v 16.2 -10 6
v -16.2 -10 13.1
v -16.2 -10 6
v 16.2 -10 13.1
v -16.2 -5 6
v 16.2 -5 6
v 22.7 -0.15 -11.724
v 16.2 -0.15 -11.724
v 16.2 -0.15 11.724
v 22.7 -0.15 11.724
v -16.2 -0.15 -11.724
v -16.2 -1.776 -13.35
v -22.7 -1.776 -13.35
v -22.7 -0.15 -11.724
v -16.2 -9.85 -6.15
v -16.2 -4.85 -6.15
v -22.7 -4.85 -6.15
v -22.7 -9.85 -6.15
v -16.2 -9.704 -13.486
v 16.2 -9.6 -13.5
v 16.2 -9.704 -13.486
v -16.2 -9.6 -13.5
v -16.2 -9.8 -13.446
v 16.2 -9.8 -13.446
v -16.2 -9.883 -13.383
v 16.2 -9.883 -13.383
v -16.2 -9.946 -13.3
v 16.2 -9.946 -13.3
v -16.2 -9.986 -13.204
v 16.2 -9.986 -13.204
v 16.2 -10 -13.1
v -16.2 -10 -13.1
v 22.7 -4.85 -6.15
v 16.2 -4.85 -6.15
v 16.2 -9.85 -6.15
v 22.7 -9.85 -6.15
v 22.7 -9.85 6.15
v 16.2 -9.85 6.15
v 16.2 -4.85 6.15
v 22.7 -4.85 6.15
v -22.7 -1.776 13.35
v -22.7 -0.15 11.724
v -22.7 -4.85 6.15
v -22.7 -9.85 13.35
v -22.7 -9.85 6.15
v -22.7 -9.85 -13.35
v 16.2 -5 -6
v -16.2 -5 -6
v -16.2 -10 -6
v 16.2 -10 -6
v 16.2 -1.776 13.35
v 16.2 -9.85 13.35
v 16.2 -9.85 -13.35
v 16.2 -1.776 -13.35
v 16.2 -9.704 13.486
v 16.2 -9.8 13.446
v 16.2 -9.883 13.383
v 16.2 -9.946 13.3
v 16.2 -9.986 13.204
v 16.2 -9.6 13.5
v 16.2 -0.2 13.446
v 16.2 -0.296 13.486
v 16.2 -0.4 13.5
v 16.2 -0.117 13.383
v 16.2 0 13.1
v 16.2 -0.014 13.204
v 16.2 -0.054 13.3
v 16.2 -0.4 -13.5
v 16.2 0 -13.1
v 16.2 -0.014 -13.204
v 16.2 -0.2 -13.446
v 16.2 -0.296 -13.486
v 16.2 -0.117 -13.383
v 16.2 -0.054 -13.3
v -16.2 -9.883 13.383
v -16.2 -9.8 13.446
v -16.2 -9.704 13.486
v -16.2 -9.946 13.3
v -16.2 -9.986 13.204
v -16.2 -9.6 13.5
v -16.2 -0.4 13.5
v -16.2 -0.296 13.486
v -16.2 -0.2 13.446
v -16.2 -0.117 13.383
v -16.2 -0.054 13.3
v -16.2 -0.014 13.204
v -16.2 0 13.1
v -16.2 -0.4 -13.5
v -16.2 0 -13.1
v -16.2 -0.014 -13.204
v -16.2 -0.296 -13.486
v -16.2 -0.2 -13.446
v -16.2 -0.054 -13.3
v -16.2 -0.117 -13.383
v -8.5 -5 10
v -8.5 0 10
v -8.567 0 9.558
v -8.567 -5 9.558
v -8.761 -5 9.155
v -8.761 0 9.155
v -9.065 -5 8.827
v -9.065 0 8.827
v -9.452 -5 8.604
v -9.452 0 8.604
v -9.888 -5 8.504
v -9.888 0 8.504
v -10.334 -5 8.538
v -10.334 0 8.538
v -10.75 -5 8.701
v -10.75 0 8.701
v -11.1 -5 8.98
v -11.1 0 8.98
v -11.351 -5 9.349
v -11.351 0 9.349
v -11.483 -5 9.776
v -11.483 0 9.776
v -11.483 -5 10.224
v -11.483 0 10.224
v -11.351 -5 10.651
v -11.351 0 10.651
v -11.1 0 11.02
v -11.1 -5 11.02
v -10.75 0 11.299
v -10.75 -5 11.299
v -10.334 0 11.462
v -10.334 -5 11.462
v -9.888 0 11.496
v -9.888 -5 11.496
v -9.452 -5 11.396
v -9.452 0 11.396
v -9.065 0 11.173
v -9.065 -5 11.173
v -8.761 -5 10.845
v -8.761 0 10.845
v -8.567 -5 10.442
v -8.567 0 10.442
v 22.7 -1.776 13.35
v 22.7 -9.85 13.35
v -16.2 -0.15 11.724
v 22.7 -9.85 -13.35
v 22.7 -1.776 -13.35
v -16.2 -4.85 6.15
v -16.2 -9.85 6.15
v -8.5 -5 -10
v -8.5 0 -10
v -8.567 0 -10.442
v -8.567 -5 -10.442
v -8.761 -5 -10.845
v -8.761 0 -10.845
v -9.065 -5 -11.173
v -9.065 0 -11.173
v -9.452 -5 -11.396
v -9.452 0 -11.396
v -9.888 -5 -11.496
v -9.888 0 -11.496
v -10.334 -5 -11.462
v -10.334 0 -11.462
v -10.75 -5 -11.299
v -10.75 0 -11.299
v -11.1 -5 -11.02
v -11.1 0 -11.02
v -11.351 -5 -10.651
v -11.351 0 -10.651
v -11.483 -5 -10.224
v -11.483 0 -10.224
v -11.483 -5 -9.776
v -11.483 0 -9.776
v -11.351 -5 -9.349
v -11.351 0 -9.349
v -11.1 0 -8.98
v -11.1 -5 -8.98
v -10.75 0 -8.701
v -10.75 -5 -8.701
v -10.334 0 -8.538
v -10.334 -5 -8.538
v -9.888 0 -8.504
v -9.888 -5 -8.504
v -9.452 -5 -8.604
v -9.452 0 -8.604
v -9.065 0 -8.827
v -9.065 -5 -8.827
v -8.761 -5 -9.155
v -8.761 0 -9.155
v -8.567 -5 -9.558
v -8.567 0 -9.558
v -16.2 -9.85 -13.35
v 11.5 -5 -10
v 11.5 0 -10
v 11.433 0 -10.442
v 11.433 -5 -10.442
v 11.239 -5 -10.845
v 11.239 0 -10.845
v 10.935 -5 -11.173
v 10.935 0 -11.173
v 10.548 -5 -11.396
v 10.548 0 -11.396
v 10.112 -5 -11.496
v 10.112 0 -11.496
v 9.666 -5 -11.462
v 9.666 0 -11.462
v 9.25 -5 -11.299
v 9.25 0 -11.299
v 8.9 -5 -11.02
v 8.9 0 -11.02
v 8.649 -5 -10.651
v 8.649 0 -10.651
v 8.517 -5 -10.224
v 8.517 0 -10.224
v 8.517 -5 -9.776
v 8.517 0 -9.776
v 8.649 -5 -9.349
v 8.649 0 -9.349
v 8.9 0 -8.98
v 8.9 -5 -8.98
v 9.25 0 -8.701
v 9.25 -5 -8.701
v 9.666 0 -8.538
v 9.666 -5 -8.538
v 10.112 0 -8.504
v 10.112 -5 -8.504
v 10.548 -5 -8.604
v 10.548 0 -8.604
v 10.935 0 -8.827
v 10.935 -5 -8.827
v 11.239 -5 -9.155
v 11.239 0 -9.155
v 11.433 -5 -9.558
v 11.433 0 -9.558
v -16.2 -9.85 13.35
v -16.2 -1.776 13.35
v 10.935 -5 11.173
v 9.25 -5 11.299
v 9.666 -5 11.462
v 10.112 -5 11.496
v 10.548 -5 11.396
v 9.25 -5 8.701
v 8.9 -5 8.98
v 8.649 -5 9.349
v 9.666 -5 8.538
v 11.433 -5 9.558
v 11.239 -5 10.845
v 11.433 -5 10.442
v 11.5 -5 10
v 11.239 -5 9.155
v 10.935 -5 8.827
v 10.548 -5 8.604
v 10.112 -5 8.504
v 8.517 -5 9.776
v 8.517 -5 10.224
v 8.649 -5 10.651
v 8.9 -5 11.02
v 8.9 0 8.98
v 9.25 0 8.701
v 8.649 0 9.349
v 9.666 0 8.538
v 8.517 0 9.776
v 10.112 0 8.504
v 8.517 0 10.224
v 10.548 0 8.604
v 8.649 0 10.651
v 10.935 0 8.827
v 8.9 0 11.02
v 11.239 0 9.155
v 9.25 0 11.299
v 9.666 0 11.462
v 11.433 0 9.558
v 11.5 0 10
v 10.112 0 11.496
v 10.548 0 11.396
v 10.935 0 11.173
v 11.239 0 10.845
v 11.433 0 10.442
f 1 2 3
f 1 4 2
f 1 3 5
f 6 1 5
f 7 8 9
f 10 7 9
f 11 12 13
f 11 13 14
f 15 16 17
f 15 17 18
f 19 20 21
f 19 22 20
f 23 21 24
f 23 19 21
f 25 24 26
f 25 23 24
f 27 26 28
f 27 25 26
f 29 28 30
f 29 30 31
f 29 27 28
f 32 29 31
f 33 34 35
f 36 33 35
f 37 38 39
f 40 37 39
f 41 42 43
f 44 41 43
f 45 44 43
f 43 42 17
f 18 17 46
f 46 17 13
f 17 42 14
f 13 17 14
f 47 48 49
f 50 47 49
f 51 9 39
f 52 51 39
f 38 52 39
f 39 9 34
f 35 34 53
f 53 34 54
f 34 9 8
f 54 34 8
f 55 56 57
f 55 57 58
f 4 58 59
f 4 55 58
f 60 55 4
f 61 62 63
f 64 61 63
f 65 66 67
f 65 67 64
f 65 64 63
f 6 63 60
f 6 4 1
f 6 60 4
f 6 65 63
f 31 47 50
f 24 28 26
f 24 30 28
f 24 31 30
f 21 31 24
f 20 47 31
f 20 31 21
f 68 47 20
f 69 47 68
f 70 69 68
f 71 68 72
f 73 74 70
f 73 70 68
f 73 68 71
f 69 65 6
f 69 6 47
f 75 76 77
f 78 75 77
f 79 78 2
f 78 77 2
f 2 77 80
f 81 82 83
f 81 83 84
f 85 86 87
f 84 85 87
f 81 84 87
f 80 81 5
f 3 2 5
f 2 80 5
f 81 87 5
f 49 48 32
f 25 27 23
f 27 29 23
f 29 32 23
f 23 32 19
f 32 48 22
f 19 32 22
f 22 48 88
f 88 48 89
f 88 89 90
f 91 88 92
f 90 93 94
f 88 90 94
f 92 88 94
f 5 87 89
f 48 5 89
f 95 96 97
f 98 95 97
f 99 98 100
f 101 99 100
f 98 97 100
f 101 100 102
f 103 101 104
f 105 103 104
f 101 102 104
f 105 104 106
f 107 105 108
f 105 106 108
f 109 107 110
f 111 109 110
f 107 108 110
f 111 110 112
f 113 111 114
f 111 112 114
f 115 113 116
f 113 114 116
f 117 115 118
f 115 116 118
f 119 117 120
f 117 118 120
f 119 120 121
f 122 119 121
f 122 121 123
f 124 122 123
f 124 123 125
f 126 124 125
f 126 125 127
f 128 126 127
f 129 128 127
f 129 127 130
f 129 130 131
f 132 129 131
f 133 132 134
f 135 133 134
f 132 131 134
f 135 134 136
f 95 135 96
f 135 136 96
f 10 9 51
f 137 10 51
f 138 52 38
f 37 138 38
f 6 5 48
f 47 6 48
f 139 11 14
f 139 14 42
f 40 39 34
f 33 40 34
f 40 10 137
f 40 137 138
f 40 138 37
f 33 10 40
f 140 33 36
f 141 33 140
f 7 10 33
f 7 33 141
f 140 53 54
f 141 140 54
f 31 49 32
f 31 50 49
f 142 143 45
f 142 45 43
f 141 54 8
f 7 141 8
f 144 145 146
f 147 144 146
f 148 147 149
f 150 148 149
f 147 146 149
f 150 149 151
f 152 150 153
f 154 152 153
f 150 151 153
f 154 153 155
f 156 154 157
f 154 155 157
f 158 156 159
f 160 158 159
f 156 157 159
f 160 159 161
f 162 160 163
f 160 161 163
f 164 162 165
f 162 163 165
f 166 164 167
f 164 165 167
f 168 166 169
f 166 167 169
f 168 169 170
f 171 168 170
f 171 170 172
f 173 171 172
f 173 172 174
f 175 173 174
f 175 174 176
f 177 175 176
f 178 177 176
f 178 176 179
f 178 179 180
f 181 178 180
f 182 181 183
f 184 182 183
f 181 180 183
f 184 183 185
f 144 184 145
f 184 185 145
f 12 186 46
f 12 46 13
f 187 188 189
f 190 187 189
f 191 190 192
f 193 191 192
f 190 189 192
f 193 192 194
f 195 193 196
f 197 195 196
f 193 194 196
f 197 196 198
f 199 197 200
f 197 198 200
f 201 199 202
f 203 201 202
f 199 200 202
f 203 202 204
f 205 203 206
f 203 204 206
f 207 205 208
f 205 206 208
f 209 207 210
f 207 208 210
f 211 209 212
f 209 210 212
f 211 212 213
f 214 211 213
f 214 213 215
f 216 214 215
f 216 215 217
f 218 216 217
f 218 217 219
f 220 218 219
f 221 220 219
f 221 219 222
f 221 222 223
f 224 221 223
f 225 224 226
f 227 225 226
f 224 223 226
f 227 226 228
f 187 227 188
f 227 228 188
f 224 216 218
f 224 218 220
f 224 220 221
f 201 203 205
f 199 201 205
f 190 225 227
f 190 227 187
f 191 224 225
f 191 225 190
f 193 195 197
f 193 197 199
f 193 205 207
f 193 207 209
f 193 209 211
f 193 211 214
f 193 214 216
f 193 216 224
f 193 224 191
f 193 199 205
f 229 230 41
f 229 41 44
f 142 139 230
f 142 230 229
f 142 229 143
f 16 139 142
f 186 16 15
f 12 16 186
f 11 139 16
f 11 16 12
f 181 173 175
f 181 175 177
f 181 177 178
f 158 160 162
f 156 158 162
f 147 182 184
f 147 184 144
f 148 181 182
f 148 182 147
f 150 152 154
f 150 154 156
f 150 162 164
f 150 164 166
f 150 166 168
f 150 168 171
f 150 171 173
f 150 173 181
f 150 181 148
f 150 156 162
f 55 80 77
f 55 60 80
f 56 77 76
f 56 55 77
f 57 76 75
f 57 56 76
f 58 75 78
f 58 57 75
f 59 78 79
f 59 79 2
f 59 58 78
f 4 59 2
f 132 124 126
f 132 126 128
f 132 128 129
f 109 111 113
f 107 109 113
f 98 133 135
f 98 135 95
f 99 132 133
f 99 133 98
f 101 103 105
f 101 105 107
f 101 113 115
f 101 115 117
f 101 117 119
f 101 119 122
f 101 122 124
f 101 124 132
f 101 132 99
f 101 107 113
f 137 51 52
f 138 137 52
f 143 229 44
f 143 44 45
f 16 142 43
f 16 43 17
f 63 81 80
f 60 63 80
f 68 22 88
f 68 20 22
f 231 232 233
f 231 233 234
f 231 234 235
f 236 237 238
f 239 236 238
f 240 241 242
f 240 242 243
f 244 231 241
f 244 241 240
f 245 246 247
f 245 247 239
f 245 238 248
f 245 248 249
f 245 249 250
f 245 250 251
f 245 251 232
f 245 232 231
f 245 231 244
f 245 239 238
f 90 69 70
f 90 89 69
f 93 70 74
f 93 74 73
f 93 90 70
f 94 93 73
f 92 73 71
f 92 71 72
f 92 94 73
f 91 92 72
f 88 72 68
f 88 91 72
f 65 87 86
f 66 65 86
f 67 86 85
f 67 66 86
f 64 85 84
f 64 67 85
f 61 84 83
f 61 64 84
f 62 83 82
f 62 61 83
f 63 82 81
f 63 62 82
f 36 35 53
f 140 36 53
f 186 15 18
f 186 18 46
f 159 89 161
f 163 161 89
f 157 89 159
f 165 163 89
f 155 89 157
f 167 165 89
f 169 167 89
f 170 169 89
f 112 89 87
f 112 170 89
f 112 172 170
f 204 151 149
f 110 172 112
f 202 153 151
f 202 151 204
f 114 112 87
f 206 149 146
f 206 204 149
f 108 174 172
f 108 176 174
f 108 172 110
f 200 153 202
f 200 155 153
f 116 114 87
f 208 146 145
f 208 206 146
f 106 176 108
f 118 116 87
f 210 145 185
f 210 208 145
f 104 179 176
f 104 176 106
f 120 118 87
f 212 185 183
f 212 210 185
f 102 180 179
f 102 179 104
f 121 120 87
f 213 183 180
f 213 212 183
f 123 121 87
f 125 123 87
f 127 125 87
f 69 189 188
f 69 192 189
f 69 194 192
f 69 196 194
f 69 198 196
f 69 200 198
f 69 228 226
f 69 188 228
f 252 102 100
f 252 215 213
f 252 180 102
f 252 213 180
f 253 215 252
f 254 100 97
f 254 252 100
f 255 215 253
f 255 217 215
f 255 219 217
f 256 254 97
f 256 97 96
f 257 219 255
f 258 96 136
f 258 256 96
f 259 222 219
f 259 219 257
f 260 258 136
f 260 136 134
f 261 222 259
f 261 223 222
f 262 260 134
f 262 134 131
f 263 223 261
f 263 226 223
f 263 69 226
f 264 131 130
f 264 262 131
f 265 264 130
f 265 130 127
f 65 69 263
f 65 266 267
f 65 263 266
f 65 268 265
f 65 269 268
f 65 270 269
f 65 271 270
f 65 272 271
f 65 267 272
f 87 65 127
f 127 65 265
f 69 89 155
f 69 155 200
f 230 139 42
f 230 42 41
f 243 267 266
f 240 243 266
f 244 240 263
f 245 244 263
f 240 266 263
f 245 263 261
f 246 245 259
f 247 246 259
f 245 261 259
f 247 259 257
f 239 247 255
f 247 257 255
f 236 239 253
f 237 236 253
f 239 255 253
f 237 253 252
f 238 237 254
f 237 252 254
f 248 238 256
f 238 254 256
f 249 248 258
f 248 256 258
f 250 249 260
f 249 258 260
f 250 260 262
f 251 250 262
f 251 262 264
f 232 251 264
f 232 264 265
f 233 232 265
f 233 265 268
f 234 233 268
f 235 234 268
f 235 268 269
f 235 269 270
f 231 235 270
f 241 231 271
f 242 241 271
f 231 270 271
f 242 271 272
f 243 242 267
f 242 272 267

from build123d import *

# Parameters (mm, degrees)
BOSS_EXTRUDE1_DEPTH      = 16.2
BOSS_EXTRUDE1_DEPTH_BACK = 16.2
SKETCH2_R                = 1.5
CUT_EXTRUDE1_DEPTH       = 5
BOSS_EXTRUDE2_DEPTH      = 6.5
BOSS_EXTRUDE3_DEPTH      = 6.5
FILLET1_R                = 0.4


with BuildPart() as part:
    # Sketch1 → Boss-Extrude1 (new body, two sides)
    with BuildSketch(Plane(origin=(0, 0, 0), x_dir=(0, 0, -1), z_dir=(1, 0, 0))) as boss_extrude1_sk:
        Polygon((13.5, 0), (-13.5, 0), (-13.5, -10), (-6, -10), (-6, -5), (6, -5), (6, -10), (13.5, -10), align=None)
    extrude(amount=BOSS_EXTRUDE1_DEPTH)
    extrude(boss_extrude1_sk.sketch, amount=-BOSS_EXTRUDE1_DEPTH_BACK)

    # Sketch2 → Cut-Extrude1 (cut)
    with BuildSketch(Plane(origin=(0, 0, 0), x_dir=(1, 0, 0), z_dir=(0, 1, 0))):
        with Locations((-10, 10)):
            Circle(SKETCH2_R)
        with Locations((-10, -10)):
            Circle(SKETCH2_R)
        with Locations((10, -10)):
            Circle(SKETCH2_R)
        with Locations((10, 10)):
            Circle(SKETCH2_R)
    extrude(amount=-CUT_EXTRUDE1_DEPTH, mode=Mode.SUBTRACT)

    # Fillet1
    fillet1_edges = [part.edges().sort_by_distance(p)[0] for p in [
        (0, -10, 13.5),
        (0, 0, 13.5),
        (0, 0, -13.5),
        (0, -10, -13.5),
    ]]
    fillet(fillet1_edges, radius=FILLET1_R)


with BuildPart() as body_2:
    # Sketch3 → Boss-Extrude2 (new body)
    with BuildSketch(Plane.ZY.offset(16.2)):
        Polygon((-13.35, -1.776345597), (-11.723654403, -0.15), (11.723654403, -0.15), (13.35, -1.776345597), (13.35, -9.85), (6.15, -9.85), (6.15, -4.85), (-6.15, -4.85), (-6.15, -9.85), (-13.35, -9.85), align=None)
    extrude(amount=BOSS_EXTRUDE2_DEPTH)


with BuildPart() as body_3:
    # Sketch4 → Boss-Extrude3 (new body)
    with BuildSketch(Plane(origin=(16.2, 0, 0), x_dir=(0, 0, -1), z_dir=(1, 0, 0))):
        Polygon((13.35, -1.776345597), (11.723654403, -0.15), (-11.723654403, -0.15), (-13.35, -1.776345597), (-13.35, -9.85), (-6.15, -9.85), (-6.15, -4.85), (6.15, -4.85), (6.15, -9.85), (13.35, -9.85), align=None)
    extrude(amount=BOSS_EXTRUDE3_DEPTH)


solid = Compound([part.part, body_2.part, body_3.part])
